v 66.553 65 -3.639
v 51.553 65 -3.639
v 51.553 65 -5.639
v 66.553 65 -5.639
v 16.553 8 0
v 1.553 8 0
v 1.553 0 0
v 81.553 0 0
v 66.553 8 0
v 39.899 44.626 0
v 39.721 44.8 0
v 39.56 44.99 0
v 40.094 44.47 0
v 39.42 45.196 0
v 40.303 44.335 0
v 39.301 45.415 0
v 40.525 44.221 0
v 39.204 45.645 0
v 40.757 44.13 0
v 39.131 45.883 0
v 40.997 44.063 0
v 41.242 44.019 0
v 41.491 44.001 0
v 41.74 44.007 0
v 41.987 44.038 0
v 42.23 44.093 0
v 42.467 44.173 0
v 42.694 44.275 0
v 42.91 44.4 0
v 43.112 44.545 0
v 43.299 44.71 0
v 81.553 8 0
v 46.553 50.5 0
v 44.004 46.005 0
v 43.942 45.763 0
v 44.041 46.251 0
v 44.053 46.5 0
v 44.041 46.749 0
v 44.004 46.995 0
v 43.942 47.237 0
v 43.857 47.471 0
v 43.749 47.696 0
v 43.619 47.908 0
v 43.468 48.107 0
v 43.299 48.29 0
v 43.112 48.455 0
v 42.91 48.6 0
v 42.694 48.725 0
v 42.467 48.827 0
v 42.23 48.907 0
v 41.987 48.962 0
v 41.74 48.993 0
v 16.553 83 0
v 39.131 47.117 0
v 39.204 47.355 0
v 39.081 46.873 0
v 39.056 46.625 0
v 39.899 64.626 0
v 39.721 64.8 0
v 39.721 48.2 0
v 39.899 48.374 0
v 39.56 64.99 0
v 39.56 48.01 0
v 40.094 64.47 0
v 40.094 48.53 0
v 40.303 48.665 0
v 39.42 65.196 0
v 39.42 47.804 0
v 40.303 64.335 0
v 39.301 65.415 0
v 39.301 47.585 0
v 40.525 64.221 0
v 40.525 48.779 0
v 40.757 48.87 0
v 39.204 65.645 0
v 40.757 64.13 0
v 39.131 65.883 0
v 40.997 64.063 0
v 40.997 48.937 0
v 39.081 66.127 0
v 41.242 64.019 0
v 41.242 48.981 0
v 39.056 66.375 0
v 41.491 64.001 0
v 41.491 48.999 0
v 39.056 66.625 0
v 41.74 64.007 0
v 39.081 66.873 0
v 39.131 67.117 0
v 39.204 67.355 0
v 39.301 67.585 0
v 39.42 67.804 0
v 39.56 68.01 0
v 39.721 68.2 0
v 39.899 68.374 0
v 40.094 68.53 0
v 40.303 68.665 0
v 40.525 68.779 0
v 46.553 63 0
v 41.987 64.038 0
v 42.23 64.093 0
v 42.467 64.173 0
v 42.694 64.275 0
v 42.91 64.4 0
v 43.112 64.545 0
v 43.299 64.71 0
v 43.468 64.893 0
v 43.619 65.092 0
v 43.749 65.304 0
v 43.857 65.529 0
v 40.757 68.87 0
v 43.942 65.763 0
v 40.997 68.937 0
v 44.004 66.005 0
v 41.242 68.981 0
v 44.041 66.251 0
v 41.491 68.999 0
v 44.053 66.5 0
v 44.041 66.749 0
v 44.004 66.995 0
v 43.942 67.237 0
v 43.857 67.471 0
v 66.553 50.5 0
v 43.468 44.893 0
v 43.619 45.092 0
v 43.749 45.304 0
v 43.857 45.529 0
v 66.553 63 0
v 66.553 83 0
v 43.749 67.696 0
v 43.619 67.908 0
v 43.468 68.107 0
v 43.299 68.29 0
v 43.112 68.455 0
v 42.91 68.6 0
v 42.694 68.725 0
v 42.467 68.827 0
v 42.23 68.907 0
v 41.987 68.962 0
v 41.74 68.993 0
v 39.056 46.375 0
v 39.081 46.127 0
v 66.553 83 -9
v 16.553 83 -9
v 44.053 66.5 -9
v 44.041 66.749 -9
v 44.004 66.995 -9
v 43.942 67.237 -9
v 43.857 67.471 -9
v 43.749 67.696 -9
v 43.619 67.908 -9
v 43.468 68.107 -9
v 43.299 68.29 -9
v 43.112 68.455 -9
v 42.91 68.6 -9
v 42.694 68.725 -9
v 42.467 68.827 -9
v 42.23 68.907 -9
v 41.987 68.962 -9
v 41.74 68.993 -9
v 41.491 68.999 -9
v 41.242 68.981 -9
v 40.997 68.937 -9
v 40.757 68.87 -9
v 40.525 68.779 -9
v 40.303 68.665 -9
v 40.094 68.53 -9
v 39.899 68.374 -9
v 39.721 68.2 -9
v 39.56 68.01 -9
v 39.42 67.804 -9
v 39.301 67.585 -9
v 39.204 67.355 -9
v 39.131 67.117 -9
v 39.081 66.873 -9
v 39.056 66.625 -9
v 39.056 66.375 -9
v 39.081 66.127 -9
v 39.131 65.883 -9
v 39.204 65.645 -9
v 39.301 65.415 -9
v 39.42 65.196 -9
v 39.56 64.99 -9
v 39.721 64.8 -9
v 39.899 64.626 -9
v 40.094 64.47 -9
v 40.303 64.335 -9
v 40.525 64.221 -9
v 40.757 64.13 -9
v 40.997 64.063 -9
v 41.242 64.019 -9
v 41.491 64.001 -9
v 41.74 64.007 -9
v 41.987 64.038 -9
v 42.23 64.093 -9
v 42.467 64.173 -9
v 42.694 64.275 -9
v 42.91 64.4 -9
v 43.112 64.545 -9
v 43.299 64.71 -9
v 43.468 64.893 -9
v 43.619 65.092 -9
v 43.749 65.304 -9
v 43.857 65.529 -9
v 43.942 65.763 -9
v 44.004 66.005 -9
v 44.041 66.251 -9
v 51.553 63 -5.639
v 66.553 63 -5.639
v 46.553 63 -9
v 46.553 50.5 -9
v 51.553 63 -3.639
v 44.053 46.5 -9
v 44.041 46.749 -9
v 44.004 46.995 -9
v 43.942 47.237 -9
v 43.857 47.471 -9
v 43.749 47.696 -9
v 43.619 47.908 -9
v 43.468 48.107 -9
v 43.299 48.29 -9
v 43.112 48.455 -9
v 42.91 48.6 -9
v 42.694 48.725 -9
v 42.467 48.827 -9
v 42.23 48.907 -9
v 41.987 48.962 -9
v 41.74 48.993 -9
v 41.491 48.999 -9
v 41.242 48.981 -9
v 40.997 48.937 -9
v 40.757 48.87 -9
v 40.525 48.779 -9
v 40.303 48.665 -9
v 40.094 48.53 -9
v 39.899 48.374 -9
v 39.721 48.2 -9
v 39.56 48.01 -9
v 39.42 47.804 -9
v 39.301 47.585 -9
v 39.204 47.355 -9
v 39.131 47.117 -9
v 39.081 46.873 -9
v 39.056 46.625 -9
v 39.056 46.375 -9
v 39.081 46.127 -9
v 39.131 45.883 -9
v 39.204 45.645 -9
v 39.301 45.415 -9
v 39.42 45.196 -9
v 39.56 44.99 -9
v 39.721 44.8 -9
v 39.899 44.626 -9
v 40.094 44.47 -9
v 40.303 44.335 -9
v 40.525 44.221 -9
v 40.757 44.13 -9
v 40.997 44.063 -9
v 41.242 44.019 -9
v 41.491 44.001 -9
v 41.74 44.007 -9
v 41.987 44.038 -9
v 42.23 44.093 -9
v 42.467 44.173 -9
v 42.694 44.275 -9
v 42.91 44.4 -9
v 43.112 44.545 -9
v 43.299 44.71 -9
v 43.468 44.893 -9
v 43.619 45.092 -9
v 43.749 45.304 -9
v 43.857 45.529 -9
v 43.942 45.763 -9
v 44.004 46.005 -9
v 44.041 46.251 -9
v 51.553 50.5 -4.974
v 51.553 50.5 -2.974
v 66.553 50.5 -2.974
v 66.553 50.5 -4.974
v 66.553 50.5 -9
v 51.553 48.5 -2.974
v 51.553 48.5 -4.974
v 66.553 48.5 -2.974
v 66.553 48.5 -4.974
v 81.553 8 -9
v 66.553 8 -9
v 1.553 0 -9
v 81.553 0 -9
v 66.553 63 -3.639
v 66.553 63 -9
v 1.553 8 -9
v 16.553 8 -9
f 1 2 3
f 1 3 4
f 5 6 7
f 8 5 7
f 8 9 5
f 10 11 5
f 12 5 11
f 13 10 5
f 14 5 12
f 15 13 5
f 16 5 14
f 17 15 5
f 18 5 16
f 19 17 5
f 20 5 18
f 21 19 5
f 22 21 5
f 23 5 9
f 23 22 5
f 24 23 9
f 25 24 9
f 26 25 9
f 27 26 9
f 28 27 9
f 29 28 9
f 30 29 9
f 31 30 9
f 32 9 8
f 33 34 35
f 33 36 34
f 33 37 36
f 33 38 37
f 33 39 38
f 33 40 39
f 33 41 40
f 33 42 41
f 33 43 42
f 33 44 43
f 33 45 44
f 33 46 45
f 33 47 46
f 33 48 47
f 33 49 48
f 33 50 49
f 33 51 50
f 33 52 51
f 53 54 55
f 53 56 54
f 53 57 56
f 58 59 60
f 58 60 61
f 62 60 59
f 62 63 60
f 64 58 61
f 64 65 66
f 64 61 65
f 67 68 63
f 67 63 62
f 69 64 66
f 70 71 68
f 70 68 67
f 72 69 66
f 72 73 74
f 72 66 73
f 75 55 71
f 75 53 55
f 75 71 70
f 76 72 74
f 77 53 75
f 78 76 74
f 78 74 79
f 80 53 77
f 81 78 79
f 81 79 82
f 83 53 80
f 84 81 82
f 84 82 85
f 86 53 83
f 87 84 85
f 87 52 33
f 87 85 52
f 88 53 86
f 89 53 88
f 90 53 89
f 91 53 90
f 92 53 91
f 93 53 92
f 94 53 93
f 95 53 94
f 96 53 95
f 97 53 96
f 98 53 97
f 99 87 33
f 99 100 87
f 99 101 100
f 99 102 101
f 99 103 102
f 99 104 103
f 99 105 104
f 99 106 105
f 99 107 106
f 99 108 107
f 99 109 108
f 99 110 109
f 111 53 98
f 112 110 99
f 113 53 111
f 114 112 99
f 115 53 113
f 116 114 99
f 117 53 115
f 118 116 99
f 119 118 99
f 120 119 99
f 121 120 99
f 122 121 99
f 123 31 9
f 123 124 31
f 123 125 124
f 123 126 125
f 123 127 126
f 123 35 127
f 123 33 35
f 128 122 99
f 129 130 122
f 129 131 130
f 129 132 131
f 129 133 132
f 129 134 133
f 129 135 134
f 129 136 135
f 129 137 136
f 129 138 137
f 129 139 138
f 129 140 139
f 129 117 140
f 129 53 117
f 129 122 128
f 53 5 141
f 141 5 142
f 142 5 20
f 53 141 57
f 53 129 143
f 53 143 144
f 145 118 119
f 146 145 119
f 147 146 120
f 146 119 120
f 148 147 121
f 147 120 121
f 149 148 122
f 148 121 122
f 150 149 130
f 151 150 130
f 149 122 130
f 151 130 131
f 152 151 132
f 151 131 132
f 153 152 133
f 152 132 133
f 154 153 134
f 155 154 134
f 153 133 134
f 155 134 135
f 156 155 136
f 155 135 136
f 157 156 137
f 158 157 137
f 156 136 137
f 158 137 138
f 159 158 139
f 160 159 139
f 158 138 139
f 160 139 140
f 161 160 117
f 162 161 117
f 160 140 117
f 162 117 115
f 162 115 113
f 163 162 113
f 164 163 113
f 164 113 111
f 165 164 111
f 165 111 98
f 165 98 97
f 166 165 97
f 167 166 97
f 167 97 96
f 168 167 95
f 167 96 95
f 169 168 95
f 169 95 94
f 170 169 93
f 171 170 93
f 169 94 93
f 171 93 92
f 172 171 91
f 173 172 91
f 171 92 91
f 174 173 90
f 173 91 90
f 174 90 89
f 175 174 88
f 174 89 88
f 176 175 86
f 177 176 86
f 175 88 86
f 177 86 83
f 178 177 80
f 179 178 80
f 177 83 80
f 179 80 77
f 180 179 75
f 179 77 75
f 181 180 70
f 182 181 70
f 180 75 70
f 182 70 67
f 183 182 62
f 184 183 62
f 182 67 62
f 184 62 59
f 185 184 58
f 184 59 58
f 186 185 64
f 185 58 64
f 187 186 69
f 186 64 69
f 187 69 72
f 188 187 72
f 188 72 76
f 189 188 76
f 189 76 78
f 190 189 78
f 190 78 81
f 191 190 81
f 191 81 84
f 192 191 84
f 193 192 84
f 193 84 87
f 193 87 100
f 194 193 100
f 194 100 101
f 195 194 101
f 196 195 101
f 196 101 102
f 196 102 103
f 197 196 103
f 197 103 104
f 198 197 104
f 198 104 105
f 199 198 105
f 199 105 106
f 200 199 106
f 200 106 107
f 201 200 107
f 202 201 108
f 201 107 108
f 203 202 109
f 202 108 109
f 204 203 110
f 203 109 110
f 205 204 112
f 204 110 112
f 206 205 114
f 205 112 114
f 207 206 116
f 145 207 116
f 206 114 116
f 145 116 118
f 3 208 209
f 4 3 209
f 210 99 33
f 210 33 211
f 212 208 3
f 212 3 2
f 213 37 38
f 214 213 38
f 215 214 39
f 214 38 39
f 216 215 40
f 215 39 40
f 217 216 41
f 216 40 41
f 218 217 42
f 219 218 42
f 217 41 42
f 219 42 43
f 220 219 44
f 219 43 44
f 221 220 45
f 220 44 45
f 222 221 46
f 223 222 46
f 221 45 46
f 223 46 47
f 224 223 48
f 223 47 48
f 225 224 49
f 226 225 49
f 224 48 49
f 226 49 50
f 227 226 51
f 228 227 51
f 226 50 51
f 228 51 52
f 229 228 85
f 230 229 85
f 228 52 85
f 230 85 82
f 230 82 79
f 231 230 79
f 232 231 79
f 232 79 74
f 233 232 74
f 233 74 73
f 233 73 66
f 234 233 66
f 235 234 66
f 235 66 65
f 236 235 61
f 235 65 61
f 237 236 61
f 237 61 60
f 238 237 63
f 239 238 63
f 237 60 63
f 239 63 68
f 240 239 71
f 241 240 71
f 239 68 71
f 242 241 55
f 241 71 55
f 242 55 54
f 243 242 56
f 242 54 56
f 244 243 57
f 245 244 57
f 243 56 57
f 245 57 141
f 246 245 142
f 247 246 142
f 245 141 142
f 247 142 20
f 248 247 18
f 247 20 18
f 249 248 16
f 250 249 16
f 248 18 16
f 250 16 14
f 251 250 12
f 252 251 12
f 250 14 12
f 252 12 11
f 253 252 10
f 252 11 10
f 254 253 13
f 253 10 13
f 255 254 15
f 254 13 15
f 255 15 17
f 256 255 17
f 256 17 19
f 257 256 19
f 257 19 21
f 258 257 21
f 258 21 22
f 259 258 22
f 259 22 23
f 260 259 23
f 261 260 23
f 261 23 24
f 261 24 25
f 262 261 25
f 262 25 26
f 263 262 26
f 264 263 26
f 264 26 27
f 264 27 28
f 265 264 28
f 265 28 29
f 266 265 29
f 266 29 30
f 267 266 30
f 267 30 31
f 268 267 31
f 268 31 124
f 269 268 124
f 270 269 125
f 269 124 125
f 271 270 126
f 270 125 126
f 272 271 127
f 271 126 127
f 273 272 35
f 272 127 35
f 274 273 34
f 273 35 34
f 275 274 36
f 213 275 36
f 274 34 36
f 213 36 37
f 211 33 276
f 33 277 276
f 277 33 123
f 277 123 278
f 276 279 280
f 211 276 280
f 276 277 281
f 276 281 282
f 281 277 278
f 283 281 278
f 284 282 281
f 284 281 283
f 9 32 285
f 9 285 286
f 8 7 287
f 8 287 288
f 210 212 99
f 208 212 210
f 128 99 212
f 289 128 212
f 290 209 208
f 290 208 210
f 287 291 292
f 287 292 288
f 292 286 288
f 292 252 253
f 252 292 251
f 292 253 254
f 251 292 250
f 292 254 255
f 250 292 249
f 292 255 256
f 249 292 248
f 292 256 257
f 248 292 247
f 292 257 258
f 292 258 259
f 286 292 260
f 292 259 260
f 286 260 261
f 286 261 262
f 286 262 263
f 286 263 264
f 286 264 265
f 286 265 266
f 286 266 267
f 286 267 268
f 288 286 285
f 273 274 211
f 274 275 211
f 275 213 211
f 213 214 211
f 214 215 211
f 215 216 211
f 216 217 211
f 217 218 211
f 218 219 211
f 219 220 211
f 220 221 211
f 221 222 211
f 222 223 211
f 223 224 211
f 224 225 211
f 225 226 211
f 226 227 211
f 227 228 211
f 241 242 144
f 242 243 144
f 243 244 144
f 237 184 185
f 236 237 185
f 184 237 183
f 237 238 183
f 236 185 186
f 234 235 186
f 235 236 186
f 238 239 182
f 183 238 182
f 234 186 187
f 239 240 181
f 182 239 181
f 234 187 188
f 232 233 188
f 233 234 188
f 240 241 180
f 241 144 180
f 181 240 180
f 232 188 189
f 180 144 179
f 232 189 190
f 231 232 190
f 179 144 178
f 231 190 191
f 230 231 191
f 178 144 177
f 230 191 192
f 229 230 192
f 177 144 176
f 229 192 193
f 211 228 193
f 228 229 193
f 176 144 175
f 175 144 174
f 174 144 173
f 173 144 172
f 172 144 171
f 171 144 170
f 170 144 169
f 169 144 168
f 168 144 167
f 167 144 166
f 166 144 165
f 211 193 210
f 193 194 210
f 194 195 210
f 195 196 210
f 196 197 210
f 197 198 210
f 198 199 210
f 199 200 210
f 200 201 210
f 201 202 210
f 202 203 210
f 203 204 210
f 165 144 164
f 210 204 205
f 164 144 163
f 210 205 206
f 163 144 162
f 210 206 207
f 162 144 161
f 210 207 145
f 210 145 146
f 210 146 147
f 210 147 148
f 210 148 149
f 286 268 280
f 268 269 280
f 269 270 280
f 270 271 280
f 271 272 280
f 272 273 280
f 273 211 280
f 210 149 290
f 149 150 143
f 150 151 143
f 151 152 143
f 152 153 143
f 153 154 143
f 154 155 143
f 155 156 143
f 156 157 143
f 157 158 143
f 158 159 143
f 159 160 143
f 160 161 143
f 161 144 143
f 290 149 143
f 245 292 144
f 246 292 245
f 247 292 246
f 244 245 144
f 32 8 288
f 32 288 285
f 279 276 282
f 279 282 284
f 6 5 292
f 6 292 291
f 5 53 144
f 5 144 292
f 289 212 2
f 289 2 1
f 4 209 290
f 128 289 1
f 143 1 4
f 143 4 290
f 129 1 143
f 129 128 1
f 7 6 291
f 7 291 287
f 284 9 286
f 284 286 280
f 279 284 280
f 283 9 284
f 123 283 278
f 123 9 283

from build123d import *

# Parameters (mm, degrees)
ESQUISSE1_R             = 2.5
BOSS_EXTRU_1_DEPTH      = 9
ESQUISSE2_W             = 9
ESQUISSE2_H             = 12.5
ENL_V_MAT_EXTRU_2_DEPTH = 20
ESQUISSE4_W             = 15
ESQUISSE4_H             = 2
ENL_V_MAT_EXTRU_4_DEPTH = 2
ESQUISSE6_W             = 15
ESQUISSE6_H             = 2
ENL_V_MAT_EXTRU_5_DEPTH = 2


with BuildPart() as part:
    # Esquisse1 → Boss.-Extru.1 (new body)
    with BuildSketch(Plane.XY):
        Polygon((1.553236782, 0), (81.553236782, 0), (81.553236782, 8), (66.553236782, 8), (66.553236782, 83), (16.553236782, 83), (16.553236782, 8), (1.553236782, 8), align=None)
        with Locations((41.553236782, 46.5)):
            Circle(ESQUISSE1_R, mode=Mode.SUBTRACT)
        with Locations((41.553236782, 66.5)):
            Circle(ESQUISSE1_R, mode=Mode.SUBTRACT)
    extrude(amount=-BOSS_EXTRU_1_DEPTH)

    # Esquisse2 → Enlèv. mat.-Extru.2 (cut)
    with BuildSketch(Plane(origin=(66.553236782, 0, 0), x_dir=(0, 0, -1), z_dir=(1, 0, 0))):
        with Locations((4.5, 56.75)):
            Rectangle(ESQUISSE2_W, ESQUISSE2_H)
    extrude(amount=-ENL_V_MAT_EXTRU_2_DEPTH, mode=Mode.SUBTRACT)

    # Esquisse4 → Enlèv. mat.-Extru.4 (cut)
    with BuildSketch(Plane(origin=(0, 50.5, 0), x_dir=(1, 0, 0), z_dir=(0, 1, 0))):
        with Locations((59.053236782, 3.973765147)):
            Rectangle(ESQUISSE4_W, ESQUISSE4_H)
    extrude(amount=-ENL_V_MAT_EXTRU_4_DEPTH, mode=Mode.SUBTRACT)

    # Esquisse6 → Enlèv. mat.-Extru.5 (cut)
    with BuildSketch(Plane.XZ.offset(-63)):
        with Locations((59.053236782, -4.638650815)):
            Rectangle(ESQUISSE6_W, ESQUISSE6_H)
    extrude(amount=-ENL_V_MAT_EXTRU_5_DEPTH, mode=Mode.SUBTRACT)


solid = part.part
